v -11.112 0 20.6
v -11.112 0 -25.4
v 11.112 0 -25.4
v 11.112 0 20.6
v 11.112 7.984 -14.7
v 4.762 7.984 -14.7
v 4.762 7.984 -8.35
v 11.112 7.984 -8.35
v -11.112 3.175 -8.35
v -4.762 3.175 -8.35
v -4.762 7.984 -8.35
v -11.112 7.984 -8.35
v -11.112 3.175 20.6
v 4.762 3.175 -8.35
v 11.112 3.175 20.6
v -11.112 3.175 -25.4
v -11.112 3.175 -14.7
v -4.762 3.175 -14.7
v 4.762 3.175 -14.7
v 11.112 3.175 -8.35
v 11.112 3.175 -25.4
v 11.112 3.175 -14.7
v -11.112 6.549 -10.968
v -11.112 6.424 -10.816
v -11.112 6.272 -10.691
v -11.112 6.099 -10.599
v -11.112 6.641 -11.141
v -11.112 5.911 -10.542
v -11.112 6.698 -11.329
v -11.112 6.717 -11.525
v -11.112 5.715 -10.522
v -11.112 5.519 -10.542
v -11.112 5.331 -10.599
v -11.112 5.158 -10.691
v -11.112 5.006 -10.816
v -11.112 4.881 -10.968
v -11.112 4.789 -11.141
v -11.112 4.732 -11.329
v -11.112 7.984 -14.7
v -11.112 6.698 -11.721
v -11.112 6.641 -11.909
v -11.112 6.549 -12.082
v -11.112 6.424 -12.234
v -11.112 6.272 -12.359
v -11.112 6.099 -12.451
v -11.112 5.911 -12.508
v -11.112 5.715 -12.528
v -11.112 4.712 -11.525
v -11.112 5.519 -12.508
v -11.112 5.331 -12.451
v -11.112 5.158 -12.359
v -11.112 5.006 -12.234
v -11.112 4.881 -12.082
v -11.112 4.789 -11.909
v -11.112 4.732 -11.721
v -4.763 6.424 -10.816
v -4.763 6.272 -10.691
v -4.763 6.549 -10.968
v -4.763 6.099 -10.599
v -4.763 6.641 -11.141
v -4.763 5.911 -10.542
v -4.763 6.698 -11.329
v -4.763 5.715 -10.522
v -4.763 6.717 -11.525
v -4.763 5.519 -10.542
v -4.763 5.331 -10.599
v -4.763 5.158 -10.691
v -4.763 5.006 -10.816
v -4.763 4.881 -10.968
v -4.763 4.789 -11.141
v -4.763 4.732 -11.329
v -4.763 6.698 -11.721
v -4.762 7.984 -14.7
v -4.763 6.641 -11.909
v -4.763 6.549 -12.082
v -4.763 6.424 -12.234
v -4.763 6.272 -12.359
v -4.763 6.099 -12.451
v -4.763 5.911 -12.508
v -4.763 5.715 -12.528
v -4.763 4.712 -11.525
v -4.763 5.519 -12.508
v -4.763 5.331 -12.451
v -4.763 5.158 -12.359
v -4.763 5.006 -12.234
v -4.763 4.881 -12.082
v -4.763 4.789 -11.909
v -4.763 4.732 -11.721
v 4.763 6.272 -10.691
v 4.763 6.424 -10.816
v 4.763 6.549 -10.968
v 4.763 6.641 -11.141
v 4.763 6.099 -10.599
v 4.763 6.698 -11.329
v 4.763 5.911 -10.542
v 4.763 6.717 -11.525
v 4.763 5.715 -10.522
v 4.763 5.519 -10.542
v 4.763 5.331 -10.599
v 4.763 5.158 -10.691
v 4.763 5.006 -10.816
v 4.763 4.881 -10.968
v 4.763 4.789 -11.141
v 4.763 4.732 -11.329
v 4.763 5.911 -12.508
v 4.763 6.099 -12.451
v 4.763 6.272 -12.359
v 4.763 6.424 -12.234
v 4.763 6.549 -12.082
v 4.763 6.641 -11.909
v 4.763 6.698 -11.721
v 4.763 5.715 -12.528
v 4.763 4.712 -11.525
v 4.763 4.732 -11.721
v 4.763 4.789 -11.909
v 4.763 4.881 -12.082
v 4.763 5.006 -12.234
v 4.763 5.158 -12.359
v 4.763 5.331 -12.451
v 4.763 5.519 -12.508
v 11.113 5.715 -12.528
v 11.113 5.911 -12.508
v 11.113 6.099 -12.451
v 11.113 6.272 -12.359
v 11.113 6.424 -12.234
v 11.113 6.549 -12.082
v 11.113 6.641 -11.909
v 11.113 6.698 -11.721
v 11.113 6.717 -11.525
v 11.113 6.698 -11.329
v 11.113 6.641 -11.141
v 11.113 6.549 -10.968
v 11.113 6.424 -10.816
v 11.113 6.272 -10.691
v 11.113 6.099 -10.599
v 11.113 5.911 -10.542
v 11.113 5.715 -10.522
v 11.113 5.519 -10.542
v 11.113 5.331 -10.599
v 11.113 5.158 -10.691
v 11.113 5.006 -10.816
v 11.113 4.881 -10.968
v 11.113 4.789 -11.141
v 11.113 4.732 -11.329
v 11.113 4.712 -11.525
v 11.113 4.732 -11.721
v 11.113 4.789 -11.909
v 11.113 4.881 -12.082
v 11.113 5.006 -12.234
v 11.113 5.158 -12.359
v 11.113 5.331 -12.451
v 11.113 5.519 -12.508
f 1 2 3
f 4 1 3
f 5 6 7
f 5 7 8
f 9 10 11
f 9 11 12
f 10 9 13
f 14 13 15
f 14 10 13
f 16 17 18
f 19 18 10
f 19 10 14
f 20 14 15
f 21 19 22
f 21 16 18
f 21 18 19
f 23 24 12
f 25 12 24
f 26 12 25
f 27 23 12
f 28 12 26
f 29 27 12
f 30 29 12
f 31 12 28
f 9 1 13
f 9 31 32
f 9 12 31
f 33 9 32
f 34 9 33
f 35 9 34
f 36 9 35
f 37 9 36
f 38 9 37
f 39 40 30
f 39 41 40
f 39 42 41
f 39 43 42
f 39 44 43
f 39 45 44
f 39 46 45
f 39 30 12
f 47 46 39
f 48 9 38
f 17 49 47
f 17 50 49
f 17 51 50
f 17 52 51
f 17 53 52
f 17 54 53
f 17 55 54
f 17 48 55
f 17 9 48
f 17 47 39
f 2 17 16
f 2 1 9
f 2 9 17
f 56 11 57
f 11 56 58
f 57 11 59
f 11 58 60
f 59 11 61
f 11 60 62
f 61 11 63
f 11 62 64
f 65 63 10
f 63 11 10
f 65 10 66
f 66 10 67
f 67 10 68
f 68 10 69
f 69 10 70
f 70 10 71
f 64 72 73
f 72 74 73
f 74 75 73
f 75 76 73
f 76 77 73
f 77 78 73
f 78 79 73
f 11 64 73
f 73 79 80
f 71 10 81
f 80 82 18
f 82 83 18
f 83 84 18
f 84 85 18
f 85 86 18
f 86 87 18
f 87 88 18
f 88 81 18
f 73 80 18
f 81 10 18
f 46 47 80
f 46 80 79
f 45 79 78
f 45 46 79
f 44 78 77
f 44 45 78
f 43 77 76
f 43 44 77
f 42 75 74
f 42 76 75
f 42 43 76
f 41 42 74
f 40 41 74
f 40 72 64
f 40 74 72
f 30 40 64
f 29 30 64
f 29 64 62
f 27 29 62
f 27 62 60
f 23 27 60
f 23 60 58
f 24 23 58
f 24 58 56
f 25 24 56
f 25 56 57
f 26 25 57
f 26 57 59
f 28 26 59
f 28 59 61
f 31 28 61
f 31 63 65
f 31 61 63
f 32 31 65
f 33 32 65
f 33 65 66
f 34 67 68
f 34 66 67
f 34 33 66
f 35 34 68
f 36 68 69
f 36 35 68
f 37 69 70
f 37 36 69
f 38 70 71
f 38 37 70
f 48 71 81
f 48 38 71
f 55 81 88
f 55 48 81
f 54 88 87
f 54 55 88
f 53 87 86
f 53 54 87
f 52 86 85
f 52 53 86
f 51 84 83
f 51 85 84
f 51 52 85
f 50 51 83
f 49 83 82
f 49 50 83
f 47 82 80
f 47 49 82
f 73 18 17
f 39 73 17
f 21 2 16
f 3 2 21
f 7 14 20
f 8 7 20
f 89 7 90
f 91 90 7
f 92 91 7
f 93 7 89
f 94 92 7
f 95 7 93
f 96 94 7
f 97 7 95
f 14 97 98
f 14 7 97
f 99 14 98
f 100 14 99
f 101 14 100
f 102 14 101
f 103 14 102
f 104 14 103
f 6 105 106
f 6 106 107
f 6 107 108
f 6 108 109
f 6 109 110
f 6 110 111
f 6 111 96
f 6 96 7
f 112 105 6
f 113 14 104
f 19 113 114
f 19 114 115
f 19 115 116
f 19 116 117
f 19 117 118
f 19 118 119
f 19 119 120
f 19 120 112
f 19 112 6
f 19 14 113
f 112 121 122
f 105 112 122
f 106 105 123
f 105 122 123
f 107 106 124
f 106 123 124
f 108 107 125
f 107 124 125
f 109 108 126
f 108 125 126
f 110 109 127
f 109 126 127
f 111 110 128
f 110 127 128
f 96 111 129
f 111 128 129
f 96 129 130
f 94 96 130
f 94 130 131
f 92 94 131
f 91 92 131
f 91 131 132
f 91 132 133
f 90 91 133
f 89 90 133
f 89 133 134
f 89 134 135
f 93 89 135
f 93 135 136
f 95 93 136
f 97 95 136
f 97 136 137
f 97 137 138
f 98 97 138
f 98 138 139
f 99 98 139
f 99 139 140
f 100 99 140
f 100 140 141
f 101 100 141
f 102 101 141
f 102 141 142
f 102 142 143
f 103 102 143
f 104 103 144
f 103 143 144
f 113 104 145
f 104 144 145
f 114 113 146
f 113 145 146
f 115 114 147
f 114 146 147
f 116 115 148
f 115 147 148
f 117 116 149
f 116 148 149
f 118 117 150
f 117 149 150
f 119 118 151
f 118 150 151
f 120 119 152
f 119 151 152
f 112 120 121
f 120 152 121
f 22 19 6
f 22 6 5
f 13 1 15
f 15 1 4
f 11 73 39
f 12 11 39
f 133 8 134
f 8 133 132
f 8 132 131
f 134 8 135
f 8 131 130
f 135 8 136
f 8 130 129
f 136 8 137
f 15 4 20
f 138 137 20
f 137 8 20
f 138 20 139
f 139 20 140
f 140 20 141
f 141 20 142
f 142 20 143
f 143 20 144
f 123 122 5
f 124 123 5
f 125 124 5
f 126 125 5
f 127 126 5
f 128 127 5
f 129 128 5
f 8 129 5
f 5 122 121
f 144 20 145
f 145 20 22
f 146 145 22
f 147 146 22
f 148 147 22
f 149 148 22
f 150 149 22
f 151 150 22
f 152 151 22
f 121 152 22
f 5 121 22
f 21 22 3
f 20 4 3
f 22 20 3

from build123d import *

# Parameters (mm, degrees)
SKETCH1_W             = 22.225
SKETCH1_H             = 46
BOSS_EXTRUDE1_DEPTH   = 3.175
SKETCH2_W             = 6.35
SKETCH2_H             = 6.35
BOSS_EXTRUDE2_DEPTH   = 4.80949
F_1_0MM_DOWEL_HOLE1_D = 2.005


with BuildPart() as part:
    # Sketch1 → Boss-Extrude1 (new body)
    with BuildSketch(Plane(origin=(0, 0, 0), x_dir=(1, 0, 0), z_dir=(0, 1, 0))):
        with Locations((0, 2.4)):
            Rectangle(SKETCH1_W, SKETCH1_H)
    extrude(amount=BOSS_EXTRUDE1_DEPTH)

    # Sketch2 → Boss-Extrude2 (add)
    with BuildSketch(Plane(origin=(0, 3.175, 0), x_dir=(1, 0, 0), z_dir=(0, 1, 0))):
        with Locations((7.9375, 11.525)):
            Rectangle(SKETCH2_W, SKETCH2_H)
    boss_extrude2 = extrude(amount=BOSS_EXTRUDE2_DEPTH)

    # Ø1.0mm Dowel Hole1 (through all)
    with Locations(Plane.ZY.offset(-4.7625)):
        with Locations((-11.525, 5.715)):
            f_1_0mm_dowel_hole1 = Hole(F_1_0MM_DOWEL_HOLE1_D / 2)

    # Mirror1: Boss-Extrude2, Ø1.0mm Dowel Hole1 across plane
    add(boss_extrude2.mirror(Plane.ZY))
    add(f_1_0mm_dowel_hole1.mirror(Plane.ZY), mode=Mode.SUBTRACT)


solid = part.part
